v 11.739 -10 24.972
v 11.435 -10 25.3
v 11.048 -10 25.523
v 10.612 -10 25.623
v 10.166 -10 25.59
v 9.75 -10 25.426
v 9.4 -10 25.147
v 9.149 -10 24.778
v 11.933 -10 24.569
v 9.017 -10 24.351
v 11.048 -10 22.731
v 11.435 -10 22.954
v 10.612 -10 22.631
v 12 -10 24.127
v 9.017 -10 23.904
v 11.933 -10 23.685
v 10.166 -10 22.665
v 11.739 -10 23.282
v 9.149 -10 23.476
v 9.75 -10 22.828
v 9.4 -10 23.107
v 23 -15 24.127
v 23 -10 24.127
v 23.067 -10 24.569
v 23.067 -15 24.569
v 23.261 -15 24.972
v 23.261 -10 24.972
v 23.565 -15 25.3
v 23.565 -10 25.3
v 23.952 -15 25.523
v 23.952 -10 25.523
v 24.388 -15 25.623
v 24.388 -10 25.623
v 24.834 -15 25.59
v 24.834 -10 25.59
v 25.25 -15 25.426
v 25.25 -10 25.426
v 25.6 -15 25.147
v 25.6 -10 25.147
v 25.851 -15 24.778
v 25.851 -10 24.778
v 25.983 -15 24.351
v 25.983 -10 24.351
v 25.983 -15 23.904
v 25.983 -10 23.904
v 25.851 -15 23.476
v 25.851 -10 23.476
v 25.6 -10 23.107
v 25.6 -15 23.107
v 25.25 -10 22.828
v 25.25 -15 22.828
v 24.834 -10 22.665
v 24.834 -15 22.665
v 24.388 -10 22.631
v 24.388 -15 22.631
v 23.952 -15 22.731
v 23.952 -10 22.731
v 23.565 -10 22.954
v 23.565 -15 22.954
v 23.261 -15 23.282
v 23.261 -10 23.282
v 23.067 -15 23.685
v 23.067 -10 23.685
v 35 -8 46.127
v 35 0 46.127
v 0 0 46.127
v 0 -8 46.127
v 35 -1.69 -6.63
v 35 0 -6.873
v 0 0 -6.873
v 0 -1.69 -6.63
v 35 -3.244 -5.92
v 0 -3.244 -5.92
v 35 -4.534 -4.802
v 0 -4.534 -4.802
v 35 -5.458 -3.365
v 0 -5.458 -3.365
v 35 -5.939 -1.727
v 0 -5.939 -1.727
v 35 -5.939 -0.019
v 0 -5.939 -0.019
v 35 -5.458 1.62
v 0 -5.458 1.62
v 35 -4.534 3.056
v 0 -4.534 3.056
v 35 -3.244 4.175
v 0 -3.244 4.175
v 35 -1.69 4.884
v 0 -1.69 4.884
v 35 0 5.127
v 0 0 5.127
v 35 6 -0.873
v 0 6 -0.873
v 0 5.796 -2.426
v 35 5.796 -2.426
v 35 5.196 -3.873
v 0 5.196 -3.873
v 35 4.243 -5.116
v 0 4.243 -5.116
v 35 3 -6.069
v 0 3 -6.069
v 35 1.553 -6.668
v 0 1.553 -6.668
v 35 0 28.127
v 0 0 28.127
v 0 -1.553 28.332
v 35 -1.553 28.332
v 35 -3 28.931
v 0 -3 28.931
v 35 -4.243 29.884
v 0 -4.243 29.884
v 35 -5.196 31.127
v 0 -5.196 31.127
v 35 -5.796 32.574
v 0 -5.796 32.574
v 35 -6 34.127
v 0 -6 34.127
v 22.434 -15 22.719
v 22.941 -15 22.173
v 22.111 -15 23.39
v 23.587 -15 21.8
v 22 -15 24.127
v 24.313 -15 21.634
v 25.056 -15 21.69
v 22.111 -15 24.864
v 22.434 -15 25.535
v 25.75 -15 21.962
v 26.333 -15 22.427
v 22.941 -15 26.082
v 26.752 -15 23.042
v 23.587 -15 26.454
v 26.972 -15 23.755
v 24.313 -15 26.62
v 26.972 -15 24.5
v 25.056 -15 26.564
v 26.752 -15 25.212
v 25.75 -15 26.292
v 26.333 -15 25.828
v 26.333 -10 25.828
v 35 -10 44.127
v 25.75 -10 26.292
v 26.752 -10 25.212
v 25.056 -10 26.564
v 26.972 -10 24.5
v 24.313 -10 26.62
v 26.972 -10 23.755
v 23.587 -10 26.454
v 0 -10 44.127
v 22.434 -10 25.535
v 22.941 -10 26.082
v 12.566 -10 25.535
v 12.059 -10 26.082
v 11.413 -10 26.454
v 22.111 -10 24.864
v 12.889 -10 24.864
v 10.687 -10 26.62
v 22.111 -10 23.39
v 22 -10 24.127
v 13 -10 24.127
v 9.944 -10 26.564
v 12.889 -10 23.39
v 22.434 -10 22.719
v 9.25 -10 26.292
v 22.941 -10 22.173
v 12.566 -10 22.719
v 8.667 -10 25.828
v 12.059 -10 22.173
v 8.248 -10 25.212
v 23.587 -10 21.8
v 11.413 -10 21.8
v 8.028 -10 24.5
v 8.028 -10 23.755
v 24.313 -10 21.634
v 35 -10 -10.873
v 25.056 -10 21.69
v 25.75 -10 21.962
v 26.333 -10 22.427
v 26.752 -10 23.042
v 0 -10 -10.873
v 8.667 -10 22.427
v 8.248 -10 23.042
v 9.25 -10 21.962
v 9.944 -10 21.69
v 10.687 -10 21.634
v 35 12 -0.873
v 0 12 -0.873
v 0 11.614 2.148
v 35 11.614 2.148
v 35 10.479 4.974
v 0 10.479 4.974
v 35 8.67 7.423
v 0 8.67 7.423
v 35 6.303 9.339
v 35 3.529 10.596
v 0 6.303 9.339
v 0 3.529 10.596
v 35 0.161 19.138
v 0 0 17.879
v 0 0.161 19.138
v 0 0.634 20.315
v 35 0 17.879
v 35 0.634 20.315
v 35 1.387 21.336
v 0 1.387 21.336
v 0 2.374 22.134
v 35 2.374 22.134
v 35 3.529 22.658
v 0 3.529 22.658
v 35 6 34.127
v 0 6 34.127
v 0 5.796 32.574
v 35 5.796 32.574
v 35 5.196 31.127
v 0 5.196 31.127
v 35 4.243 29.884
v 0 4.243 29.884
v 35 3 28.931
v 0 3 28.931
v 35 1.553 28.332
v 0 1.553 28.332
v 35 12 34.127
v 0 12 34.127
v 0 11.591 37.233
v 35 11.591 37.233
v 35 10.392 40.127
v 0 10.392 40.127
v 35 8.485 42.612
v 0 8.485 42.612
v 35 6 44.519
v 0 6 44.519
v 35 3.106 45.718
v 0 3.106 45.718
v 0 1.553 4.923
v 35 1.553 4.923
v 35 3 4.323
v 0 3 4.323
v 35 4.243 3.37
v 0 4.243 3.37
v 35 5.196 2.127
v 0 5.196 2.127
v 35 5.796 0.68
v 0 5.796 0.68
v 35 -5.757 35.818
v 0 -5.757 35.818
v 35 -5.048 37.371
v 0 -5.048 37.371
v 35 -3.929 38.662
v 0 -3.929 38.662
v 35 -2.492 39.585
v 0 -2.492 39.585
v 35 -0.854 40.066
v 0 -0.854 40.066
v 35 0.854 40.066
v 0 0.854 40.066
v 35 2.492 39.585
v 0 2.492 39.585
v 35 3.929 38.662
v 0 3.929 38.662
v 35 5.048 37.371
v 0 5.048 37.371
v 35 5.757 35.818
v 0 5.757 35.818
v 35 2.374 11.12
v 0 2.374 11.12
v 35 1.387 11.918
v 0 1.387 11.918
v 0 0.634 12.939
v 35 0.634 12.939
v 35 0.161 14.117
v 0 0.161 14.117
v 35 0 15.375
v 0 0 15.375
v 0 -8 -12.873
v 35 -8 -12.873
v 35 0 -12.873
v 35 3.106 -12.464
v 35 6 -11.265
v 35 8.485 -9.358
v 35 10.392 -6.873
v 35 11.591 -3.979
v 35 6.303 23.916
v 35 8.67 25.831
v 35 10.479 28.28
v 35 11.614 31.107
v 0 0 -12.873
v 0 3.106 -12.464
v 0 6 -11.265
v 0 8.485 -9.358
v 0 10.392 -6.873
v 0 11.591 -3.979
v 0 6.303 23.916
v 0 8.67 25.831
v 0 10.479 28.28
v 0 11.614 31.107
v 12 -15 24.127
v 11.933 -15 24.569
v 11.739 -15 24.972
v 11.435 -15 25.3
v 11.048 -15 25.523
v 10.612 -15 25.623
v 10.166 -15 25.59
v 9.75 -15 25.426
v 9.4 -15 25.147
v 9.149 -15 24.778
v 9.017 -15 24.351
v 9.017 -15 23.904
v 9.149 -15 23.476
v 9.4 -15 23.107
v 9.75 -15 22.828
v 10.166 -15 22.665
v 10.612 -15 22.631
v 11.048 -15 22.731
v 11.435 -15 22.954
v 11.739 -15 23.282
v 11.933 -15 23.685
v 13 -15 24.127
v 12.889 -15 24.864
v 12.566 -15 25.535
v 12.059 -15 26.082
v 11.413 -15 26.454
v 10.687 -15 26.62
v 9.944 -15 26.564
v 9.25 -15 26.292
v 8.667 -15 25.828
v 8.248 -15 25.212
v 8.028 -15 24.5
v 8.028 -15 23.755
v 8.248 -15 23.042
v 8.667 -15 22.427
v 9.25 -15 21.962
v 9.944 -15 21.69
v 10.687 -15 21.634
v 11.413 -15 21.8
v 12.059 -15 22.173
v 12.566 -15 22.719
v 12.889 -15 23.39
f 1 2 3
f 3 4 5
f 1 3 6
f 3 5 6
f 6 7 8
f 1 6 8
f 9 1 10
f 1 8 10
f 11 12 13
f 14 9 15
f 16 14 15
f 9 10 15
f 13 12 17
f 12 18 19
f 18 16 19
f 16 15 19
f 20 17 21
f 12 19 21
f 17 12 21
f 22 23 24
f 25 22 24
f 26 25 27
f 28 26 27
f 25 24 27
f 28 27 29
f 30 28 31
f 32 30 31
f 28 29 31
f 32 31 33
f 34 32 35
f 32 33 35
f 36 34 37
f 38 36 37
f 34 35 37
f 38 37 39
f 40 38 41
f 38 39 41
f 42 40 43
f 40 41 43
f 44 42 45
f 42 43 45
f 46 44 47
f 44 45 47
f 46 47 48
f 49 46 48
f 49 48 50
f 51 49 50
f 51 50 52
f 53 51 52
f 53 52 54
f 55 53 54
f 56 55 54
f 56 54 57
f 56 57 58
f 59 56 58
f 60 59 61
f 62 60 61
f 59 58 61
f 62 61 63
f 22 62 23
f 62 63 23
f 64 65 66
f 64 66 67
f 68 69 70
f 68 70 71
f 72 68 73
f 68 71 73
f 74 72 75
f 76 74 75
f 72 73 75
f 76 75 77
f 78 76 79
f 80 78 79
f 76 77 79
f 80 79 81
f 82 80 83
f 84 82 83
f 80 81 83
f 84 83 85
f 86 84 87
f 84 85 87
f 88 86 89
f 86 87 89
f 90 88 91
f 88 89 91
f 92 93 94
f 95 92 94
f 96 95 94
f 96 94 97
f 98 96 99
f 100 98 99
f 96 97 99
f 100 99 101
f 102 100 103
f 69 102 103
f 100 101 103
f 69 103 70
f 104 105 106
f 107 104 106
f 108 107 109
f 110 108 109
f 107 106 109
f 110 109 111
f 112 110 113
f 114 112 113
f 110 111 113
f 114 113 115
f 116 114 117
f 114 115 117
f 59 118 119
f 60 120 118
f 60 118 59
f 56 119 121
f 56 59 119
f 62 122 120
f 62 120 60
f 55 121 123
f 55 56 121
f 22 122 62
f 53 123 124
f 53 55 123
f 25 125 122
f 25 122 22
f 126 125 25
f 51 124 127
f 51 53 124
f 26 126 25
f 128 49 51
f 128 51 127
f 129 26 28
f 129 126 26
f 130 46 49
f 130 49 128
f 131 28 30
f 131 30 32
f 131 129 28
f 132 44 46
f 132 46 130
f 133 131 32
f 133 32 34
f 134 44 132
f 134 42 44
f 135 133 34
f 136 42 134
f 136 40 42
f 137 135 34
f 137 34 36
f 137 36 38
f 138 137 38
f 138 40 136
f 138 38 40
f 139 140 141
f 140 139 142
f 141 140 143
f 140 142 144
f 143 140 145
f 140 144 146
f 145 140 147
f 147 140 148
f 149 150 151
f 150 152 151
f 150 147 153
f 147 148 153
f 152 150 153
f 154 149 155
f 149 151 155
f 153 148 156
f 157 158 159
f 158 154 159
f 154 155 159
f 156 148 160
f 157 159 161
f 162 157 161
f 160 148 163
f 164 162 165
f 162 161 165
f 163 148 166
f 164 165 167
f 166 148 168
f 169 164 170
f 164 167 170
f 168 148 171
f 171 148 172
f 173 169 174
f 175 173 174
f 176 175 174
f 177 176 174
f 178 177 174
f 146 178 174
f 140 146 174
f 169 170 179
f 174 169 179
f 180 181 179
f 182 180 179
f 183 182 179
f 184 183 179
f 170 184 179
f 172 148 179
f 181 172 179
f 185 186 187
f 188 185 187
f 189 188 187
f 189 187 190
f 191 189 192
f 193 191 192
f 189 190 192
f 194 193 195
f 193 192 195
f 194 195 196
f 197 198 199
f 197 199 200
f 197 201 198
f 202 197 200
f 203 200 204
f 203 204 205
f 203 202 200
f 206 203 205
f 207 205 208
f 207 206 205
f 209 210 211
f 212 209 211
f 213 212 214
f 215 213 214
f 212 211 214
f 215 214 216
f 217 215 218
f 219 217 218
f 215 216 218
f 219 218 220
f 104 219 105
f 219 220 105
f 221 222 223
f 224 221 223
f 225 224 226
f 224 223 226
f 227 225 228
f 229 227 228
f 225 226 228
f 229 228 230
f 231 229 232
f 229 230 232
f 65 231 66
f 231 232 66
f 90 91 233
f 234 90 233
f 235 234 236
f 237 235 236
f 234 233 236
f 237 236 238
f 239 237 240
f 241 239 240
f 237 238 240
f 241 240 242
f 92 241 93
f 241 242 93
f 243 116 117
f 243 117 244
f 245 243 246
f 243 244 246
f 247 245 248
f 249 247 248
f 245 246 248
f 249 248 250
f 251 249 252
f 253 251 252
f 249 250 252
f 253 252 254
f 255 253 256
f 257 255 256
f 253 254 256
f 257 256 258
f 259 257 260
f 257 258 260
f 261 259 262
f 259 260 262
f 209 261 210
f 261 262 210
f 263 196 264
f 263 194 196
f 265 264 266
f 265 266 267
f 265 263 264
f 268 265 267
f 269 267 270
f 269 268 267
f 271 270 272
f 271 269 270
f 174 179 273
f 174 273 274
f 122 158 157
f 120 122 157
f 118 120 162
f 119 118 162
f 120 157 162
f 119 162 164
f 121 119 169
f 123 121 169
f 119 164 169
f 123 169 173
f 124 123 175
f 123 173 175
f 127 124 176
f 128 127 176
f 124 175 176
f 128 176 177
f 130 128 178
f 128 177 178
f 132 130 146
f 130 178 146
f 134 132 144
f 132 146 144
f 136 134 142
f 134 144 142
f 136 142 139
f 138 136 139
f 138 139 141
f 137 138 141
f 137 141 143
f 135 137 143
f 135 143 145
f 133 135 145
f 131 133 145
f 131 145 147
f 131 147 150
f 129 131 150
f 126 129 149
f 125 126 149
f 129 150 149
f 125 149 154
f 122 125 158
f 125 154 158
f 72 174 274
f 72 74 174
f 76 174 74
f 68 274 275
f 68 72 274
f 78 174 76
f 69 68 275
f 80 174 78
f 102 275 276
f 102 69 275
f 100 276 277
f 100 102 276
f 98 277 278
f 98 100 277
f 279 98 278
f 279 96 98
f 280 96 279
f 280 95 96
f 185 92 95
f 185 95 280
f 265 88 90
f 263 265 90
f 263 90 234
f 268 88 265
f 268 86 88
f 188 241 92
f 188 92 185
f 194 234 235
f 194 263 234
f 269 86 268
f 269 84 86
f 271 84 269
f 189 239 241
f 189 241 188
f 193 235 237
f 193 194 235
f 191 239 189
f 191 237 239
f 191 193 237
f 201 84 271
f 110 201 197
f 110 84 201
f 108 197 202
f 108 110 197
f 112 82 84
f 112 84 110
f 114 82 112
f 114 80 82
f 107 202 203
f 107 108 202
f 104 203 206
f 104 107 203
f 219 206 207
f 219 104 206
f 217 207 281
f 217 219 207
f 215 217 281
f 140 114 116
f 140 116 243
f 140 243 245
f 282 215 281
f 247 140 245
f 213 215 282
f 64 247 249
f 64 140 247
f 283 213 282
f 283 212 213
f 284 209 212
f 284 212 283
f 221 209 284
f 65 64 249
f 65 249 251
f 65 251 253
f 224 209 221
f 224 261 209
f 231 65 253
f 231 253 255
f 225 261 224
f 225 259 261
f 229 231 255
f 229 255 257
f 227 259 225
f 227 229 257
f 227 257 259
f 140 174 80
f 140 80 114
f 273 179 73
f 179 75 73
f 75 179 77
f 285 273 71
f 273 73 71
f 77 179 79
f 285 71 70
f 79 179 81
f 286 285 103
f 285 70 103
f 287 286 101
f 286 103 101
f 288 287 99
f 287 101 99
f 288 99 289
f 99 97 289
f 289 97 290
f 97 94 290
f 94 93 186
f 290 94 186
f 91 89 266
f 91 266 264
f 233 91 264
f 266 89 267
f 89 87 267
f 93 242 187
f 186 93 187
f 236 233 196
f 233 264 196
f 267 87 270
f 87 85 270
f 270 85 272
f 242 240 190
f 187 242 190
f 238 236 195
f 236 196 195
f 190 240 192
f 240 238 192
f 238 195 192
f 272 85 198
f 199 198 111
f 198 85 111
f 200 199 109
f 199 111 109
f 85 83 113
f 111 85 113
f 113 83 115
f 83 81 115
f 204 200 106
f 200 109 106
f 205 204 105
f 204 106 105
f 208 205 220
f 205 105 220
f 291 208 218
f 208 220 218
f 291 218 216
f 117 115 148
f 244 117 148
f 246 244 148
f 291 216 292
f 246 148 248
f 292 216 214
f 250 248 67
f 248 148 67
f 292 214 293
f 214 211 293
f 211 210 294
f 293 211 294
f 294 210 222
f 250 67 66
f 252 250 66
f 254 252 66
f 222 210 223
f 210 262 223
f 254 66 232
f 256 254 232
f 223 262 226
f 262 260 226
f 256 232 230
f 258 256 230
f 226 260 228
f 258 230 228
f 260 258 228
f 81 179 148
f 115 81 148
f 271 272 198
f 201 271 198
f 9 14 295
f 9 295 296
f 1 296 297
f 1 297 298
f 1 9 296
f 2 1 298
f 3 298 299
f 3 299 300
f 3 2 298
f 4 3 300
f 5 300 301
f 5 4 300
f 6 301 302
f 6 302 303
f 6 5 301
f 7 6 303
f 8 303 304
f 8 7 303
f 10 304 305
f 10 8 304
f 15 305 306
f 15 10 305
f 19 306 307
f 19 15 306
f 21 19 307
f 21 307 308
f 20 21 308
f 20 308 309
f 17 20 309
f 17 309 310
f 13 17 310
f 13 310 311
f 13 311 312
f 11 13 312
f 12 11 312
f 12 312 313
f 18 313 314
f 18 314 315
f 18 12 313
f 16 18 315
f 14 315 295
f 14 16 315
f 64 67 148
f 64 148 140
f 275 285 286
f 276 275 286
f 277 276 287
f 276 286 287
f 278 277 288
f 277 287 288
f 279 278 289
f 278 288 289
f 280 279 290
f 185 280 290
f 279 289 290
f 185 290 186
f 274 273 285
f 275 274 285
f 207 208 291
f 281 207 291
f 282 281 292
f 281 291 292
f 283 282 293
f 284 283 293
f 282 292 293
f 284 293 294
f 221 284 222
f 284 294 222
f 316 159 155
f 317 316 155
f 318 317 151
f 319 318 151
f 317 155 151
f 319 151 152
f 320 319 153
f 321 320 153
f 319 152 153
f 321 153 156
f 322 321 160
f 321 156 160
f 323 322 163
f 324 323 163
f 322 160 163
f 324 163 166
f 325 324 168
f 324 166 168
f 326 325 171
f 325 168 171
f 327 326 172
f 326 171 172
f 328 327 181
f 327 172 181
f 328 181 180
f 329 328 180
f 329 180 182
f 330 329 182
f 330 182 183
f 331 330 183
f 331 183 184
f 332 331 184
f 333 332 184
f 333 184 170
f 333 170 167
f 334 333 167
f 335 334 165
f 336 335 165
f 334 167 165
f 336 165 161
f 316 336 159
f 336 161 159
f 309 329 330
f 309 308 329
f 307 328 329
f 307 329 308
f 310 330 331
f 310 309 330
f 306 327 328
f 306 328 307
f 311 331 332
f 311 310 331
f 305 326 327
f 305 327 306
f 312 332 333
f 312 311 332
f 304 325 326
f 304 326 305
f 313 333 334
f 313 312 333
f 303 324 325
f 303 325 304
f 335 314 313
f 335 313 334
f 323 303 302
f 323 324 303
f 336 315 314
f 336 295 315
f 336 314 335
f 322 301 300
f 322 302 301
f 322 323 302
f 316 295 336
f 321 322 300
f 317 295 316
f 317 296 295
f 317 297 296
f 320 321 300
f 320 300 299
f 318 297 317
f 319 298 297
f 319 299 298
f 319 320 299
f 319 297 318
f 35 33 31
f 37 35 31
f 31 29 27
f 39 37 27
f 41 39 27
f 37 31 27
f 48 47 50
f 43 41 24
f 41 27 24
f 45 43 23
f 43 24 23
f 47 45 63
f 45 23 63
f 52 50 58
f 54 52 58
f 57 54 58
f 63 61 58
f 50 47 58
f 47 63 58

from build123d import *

# Parameters (mm, degrees)
F1_DEPTH = 35
F2_R     = 5
F3_SIZE  = 2
F4_R     = 2.5
F4_R_2   = 1.5
F5_DEPTH = 5


with BuildPart() as f1:
    # F0 (on Right) → F1 (new body)
    with BuildSketch(Plane.YZ):
        with BuildLine():
            ThreePointArc((12, -0.8728863157), (8.4852813742, 7.6123950585), (0, 11.1271136843))
            Line((0, 11.1271136843), (0, 5.1271136843))
            ThreePointArc((0, 5.1271136843), (4.2426406871, 3.3697543714), (6, -0.8728863157))
            ThreePointArc((6, -0.8728863157), (4.2426406871, -5.1155270029), (0, -6.8728863157))
            Line((0, -6.8728863157), (0, -12.8728863157))
            ThreePointArc((0, -12.8728863157), (8.4852813742, -9.35816769), (12, -0.8728863157))
        make_face()
        with BuildLine():
            Line((0, 5.1271136843), (0, 11.1271136843))
            ThreePointArc((0, 11.1271136843), (-5.6745486619, 9.7006418317), (-10, 5.760363265))
            Line((-10, 5.760363265), (-10, -7.5061358965))
            ThreePointArc((-10, -7.5061358965), (-5.6745486619, -11.4464144632), (0, -12.8728863157))
            Line((0, -12.8728863157), (0, -6.8728863157))
            ThreePointArc((0, -6.8728863157), (-6, -0.8728863157), (0, 5.1271136843))
        make_face()
        with BuildLine():
            Line((-10, -12.8728863157), (0, -12.8728863157))
            ThreePointArc((0, -12.8728863157), (-5.6745486619, -11.4464144632), (-10, -7.5061358965))
            Line((-10, -7.5061358965), (-10, -12.8728863157))
        make_face()
        with BuildLine():
            Line((0, 11.1271136843), (0, 22.1271136843))
            ThreePointArc((0, 22.1271136843), (-5.6745486619, 23.5535855368), (-10, 27.4938641035))
            Line((-10, 27.4938641035), (-10, 5.760363265))
            ThreePointArc((-10, 5.760363265), (-5.6745486619, 9.7006418317), (0, 11.1271136843))
        make_face()
        with BuildLine():
            ThreePointArc((-10, 27.4938641035), (-5.6745486619, 23.5535855368), (0, 22.1271136843))
            ThreePointArc((0, 22.1271136843), (8.4852813742, 25.64183231), (12, 34.1271136843))
            ThreePointArc((12, 34.1271136843), (8.4852813742, 42.6123950585), (0, 46.1271136843))
            ThreePointArc((0, 46.1271136843), (-5.6745486619, 44.7006418317), (-10, 40.760363265))
            Line((-10, 40.760363265), (-10, 27.4938641035))
        make_face()
        with BuildLine():
            ThreePointArc((-6, 34.1271136843), (0, 40.1271136843), (6, 34.1271136843))
            ThreePointArc((6, 34.1271136843), (4.2426406871, 29.8844729971), (0, 28.1271136843))
            ThreePointArc((0, 28.1271136843), (-4.2426406871, 29.8844729971), (-6, 34.1271136843))
        make_face(mode=Mode.SUBTRACT)
        with BuildLine():
            Line((-10, 46.1271136843), (-10, 40.760363265))
            ThreePointArc((-10, 40.760363265), (-5.6745486619, 44.7006418317), (0, 46.1271136843))
            Line((0, 46.1271136843), (-10, 46.1271136843))
        make_face()
    extrude(amount=F1_DEPTH)

    # F2
    f2_edges = [f1.edges().sort_by_distance(p)[0] for p in [
        (17.5, 0, 22.127114),
        (17.5, 0, 11.127114),
    ]]
    fillet(f2_edges, radius=F2_R)

    # F3
    f3_edges = [f1.edges().sort_by_distance(p)[0] for p in [
        (17.5, -10, -12.872886),
        (17.5, -10, 46.127114),
    ]]
    chamfer(f3_edges, length=F3_SIZE)

    # F4 (on face) → F5 (join)
    with BuildSketch(Plane.XZ.offset(10)):
        with Locations((10.5, 24.1271136843)):
            Circle(F4_R)
        with Locations((10.5, 24.1271136843)):
            Circle(F4_R_2, mode=Mode.SUBTRACT)
        with BuildLine():
            ThreePointArc((27, 24.1271136843), (24.5, 26.6271136843), (22, 24.1271136843))
            ThreePointArc((22, 24.1271136843), (24.5, 21.6271136843), (27, 24.1271136843))
        make_face()
        with BuildLine():
            ThreePointArc((26, 24.1271136843), (24.5, 22.6271136843), (23, 24.1271136843))
            ThreePointArc((23, 24.1271136843), (24.5, 25.6271136843), (26, 24.1271136843))
        make_face(mode=Mode.SUBTRACT)
    extrude(amount=F5_DEPTH)


solid = f1.part
